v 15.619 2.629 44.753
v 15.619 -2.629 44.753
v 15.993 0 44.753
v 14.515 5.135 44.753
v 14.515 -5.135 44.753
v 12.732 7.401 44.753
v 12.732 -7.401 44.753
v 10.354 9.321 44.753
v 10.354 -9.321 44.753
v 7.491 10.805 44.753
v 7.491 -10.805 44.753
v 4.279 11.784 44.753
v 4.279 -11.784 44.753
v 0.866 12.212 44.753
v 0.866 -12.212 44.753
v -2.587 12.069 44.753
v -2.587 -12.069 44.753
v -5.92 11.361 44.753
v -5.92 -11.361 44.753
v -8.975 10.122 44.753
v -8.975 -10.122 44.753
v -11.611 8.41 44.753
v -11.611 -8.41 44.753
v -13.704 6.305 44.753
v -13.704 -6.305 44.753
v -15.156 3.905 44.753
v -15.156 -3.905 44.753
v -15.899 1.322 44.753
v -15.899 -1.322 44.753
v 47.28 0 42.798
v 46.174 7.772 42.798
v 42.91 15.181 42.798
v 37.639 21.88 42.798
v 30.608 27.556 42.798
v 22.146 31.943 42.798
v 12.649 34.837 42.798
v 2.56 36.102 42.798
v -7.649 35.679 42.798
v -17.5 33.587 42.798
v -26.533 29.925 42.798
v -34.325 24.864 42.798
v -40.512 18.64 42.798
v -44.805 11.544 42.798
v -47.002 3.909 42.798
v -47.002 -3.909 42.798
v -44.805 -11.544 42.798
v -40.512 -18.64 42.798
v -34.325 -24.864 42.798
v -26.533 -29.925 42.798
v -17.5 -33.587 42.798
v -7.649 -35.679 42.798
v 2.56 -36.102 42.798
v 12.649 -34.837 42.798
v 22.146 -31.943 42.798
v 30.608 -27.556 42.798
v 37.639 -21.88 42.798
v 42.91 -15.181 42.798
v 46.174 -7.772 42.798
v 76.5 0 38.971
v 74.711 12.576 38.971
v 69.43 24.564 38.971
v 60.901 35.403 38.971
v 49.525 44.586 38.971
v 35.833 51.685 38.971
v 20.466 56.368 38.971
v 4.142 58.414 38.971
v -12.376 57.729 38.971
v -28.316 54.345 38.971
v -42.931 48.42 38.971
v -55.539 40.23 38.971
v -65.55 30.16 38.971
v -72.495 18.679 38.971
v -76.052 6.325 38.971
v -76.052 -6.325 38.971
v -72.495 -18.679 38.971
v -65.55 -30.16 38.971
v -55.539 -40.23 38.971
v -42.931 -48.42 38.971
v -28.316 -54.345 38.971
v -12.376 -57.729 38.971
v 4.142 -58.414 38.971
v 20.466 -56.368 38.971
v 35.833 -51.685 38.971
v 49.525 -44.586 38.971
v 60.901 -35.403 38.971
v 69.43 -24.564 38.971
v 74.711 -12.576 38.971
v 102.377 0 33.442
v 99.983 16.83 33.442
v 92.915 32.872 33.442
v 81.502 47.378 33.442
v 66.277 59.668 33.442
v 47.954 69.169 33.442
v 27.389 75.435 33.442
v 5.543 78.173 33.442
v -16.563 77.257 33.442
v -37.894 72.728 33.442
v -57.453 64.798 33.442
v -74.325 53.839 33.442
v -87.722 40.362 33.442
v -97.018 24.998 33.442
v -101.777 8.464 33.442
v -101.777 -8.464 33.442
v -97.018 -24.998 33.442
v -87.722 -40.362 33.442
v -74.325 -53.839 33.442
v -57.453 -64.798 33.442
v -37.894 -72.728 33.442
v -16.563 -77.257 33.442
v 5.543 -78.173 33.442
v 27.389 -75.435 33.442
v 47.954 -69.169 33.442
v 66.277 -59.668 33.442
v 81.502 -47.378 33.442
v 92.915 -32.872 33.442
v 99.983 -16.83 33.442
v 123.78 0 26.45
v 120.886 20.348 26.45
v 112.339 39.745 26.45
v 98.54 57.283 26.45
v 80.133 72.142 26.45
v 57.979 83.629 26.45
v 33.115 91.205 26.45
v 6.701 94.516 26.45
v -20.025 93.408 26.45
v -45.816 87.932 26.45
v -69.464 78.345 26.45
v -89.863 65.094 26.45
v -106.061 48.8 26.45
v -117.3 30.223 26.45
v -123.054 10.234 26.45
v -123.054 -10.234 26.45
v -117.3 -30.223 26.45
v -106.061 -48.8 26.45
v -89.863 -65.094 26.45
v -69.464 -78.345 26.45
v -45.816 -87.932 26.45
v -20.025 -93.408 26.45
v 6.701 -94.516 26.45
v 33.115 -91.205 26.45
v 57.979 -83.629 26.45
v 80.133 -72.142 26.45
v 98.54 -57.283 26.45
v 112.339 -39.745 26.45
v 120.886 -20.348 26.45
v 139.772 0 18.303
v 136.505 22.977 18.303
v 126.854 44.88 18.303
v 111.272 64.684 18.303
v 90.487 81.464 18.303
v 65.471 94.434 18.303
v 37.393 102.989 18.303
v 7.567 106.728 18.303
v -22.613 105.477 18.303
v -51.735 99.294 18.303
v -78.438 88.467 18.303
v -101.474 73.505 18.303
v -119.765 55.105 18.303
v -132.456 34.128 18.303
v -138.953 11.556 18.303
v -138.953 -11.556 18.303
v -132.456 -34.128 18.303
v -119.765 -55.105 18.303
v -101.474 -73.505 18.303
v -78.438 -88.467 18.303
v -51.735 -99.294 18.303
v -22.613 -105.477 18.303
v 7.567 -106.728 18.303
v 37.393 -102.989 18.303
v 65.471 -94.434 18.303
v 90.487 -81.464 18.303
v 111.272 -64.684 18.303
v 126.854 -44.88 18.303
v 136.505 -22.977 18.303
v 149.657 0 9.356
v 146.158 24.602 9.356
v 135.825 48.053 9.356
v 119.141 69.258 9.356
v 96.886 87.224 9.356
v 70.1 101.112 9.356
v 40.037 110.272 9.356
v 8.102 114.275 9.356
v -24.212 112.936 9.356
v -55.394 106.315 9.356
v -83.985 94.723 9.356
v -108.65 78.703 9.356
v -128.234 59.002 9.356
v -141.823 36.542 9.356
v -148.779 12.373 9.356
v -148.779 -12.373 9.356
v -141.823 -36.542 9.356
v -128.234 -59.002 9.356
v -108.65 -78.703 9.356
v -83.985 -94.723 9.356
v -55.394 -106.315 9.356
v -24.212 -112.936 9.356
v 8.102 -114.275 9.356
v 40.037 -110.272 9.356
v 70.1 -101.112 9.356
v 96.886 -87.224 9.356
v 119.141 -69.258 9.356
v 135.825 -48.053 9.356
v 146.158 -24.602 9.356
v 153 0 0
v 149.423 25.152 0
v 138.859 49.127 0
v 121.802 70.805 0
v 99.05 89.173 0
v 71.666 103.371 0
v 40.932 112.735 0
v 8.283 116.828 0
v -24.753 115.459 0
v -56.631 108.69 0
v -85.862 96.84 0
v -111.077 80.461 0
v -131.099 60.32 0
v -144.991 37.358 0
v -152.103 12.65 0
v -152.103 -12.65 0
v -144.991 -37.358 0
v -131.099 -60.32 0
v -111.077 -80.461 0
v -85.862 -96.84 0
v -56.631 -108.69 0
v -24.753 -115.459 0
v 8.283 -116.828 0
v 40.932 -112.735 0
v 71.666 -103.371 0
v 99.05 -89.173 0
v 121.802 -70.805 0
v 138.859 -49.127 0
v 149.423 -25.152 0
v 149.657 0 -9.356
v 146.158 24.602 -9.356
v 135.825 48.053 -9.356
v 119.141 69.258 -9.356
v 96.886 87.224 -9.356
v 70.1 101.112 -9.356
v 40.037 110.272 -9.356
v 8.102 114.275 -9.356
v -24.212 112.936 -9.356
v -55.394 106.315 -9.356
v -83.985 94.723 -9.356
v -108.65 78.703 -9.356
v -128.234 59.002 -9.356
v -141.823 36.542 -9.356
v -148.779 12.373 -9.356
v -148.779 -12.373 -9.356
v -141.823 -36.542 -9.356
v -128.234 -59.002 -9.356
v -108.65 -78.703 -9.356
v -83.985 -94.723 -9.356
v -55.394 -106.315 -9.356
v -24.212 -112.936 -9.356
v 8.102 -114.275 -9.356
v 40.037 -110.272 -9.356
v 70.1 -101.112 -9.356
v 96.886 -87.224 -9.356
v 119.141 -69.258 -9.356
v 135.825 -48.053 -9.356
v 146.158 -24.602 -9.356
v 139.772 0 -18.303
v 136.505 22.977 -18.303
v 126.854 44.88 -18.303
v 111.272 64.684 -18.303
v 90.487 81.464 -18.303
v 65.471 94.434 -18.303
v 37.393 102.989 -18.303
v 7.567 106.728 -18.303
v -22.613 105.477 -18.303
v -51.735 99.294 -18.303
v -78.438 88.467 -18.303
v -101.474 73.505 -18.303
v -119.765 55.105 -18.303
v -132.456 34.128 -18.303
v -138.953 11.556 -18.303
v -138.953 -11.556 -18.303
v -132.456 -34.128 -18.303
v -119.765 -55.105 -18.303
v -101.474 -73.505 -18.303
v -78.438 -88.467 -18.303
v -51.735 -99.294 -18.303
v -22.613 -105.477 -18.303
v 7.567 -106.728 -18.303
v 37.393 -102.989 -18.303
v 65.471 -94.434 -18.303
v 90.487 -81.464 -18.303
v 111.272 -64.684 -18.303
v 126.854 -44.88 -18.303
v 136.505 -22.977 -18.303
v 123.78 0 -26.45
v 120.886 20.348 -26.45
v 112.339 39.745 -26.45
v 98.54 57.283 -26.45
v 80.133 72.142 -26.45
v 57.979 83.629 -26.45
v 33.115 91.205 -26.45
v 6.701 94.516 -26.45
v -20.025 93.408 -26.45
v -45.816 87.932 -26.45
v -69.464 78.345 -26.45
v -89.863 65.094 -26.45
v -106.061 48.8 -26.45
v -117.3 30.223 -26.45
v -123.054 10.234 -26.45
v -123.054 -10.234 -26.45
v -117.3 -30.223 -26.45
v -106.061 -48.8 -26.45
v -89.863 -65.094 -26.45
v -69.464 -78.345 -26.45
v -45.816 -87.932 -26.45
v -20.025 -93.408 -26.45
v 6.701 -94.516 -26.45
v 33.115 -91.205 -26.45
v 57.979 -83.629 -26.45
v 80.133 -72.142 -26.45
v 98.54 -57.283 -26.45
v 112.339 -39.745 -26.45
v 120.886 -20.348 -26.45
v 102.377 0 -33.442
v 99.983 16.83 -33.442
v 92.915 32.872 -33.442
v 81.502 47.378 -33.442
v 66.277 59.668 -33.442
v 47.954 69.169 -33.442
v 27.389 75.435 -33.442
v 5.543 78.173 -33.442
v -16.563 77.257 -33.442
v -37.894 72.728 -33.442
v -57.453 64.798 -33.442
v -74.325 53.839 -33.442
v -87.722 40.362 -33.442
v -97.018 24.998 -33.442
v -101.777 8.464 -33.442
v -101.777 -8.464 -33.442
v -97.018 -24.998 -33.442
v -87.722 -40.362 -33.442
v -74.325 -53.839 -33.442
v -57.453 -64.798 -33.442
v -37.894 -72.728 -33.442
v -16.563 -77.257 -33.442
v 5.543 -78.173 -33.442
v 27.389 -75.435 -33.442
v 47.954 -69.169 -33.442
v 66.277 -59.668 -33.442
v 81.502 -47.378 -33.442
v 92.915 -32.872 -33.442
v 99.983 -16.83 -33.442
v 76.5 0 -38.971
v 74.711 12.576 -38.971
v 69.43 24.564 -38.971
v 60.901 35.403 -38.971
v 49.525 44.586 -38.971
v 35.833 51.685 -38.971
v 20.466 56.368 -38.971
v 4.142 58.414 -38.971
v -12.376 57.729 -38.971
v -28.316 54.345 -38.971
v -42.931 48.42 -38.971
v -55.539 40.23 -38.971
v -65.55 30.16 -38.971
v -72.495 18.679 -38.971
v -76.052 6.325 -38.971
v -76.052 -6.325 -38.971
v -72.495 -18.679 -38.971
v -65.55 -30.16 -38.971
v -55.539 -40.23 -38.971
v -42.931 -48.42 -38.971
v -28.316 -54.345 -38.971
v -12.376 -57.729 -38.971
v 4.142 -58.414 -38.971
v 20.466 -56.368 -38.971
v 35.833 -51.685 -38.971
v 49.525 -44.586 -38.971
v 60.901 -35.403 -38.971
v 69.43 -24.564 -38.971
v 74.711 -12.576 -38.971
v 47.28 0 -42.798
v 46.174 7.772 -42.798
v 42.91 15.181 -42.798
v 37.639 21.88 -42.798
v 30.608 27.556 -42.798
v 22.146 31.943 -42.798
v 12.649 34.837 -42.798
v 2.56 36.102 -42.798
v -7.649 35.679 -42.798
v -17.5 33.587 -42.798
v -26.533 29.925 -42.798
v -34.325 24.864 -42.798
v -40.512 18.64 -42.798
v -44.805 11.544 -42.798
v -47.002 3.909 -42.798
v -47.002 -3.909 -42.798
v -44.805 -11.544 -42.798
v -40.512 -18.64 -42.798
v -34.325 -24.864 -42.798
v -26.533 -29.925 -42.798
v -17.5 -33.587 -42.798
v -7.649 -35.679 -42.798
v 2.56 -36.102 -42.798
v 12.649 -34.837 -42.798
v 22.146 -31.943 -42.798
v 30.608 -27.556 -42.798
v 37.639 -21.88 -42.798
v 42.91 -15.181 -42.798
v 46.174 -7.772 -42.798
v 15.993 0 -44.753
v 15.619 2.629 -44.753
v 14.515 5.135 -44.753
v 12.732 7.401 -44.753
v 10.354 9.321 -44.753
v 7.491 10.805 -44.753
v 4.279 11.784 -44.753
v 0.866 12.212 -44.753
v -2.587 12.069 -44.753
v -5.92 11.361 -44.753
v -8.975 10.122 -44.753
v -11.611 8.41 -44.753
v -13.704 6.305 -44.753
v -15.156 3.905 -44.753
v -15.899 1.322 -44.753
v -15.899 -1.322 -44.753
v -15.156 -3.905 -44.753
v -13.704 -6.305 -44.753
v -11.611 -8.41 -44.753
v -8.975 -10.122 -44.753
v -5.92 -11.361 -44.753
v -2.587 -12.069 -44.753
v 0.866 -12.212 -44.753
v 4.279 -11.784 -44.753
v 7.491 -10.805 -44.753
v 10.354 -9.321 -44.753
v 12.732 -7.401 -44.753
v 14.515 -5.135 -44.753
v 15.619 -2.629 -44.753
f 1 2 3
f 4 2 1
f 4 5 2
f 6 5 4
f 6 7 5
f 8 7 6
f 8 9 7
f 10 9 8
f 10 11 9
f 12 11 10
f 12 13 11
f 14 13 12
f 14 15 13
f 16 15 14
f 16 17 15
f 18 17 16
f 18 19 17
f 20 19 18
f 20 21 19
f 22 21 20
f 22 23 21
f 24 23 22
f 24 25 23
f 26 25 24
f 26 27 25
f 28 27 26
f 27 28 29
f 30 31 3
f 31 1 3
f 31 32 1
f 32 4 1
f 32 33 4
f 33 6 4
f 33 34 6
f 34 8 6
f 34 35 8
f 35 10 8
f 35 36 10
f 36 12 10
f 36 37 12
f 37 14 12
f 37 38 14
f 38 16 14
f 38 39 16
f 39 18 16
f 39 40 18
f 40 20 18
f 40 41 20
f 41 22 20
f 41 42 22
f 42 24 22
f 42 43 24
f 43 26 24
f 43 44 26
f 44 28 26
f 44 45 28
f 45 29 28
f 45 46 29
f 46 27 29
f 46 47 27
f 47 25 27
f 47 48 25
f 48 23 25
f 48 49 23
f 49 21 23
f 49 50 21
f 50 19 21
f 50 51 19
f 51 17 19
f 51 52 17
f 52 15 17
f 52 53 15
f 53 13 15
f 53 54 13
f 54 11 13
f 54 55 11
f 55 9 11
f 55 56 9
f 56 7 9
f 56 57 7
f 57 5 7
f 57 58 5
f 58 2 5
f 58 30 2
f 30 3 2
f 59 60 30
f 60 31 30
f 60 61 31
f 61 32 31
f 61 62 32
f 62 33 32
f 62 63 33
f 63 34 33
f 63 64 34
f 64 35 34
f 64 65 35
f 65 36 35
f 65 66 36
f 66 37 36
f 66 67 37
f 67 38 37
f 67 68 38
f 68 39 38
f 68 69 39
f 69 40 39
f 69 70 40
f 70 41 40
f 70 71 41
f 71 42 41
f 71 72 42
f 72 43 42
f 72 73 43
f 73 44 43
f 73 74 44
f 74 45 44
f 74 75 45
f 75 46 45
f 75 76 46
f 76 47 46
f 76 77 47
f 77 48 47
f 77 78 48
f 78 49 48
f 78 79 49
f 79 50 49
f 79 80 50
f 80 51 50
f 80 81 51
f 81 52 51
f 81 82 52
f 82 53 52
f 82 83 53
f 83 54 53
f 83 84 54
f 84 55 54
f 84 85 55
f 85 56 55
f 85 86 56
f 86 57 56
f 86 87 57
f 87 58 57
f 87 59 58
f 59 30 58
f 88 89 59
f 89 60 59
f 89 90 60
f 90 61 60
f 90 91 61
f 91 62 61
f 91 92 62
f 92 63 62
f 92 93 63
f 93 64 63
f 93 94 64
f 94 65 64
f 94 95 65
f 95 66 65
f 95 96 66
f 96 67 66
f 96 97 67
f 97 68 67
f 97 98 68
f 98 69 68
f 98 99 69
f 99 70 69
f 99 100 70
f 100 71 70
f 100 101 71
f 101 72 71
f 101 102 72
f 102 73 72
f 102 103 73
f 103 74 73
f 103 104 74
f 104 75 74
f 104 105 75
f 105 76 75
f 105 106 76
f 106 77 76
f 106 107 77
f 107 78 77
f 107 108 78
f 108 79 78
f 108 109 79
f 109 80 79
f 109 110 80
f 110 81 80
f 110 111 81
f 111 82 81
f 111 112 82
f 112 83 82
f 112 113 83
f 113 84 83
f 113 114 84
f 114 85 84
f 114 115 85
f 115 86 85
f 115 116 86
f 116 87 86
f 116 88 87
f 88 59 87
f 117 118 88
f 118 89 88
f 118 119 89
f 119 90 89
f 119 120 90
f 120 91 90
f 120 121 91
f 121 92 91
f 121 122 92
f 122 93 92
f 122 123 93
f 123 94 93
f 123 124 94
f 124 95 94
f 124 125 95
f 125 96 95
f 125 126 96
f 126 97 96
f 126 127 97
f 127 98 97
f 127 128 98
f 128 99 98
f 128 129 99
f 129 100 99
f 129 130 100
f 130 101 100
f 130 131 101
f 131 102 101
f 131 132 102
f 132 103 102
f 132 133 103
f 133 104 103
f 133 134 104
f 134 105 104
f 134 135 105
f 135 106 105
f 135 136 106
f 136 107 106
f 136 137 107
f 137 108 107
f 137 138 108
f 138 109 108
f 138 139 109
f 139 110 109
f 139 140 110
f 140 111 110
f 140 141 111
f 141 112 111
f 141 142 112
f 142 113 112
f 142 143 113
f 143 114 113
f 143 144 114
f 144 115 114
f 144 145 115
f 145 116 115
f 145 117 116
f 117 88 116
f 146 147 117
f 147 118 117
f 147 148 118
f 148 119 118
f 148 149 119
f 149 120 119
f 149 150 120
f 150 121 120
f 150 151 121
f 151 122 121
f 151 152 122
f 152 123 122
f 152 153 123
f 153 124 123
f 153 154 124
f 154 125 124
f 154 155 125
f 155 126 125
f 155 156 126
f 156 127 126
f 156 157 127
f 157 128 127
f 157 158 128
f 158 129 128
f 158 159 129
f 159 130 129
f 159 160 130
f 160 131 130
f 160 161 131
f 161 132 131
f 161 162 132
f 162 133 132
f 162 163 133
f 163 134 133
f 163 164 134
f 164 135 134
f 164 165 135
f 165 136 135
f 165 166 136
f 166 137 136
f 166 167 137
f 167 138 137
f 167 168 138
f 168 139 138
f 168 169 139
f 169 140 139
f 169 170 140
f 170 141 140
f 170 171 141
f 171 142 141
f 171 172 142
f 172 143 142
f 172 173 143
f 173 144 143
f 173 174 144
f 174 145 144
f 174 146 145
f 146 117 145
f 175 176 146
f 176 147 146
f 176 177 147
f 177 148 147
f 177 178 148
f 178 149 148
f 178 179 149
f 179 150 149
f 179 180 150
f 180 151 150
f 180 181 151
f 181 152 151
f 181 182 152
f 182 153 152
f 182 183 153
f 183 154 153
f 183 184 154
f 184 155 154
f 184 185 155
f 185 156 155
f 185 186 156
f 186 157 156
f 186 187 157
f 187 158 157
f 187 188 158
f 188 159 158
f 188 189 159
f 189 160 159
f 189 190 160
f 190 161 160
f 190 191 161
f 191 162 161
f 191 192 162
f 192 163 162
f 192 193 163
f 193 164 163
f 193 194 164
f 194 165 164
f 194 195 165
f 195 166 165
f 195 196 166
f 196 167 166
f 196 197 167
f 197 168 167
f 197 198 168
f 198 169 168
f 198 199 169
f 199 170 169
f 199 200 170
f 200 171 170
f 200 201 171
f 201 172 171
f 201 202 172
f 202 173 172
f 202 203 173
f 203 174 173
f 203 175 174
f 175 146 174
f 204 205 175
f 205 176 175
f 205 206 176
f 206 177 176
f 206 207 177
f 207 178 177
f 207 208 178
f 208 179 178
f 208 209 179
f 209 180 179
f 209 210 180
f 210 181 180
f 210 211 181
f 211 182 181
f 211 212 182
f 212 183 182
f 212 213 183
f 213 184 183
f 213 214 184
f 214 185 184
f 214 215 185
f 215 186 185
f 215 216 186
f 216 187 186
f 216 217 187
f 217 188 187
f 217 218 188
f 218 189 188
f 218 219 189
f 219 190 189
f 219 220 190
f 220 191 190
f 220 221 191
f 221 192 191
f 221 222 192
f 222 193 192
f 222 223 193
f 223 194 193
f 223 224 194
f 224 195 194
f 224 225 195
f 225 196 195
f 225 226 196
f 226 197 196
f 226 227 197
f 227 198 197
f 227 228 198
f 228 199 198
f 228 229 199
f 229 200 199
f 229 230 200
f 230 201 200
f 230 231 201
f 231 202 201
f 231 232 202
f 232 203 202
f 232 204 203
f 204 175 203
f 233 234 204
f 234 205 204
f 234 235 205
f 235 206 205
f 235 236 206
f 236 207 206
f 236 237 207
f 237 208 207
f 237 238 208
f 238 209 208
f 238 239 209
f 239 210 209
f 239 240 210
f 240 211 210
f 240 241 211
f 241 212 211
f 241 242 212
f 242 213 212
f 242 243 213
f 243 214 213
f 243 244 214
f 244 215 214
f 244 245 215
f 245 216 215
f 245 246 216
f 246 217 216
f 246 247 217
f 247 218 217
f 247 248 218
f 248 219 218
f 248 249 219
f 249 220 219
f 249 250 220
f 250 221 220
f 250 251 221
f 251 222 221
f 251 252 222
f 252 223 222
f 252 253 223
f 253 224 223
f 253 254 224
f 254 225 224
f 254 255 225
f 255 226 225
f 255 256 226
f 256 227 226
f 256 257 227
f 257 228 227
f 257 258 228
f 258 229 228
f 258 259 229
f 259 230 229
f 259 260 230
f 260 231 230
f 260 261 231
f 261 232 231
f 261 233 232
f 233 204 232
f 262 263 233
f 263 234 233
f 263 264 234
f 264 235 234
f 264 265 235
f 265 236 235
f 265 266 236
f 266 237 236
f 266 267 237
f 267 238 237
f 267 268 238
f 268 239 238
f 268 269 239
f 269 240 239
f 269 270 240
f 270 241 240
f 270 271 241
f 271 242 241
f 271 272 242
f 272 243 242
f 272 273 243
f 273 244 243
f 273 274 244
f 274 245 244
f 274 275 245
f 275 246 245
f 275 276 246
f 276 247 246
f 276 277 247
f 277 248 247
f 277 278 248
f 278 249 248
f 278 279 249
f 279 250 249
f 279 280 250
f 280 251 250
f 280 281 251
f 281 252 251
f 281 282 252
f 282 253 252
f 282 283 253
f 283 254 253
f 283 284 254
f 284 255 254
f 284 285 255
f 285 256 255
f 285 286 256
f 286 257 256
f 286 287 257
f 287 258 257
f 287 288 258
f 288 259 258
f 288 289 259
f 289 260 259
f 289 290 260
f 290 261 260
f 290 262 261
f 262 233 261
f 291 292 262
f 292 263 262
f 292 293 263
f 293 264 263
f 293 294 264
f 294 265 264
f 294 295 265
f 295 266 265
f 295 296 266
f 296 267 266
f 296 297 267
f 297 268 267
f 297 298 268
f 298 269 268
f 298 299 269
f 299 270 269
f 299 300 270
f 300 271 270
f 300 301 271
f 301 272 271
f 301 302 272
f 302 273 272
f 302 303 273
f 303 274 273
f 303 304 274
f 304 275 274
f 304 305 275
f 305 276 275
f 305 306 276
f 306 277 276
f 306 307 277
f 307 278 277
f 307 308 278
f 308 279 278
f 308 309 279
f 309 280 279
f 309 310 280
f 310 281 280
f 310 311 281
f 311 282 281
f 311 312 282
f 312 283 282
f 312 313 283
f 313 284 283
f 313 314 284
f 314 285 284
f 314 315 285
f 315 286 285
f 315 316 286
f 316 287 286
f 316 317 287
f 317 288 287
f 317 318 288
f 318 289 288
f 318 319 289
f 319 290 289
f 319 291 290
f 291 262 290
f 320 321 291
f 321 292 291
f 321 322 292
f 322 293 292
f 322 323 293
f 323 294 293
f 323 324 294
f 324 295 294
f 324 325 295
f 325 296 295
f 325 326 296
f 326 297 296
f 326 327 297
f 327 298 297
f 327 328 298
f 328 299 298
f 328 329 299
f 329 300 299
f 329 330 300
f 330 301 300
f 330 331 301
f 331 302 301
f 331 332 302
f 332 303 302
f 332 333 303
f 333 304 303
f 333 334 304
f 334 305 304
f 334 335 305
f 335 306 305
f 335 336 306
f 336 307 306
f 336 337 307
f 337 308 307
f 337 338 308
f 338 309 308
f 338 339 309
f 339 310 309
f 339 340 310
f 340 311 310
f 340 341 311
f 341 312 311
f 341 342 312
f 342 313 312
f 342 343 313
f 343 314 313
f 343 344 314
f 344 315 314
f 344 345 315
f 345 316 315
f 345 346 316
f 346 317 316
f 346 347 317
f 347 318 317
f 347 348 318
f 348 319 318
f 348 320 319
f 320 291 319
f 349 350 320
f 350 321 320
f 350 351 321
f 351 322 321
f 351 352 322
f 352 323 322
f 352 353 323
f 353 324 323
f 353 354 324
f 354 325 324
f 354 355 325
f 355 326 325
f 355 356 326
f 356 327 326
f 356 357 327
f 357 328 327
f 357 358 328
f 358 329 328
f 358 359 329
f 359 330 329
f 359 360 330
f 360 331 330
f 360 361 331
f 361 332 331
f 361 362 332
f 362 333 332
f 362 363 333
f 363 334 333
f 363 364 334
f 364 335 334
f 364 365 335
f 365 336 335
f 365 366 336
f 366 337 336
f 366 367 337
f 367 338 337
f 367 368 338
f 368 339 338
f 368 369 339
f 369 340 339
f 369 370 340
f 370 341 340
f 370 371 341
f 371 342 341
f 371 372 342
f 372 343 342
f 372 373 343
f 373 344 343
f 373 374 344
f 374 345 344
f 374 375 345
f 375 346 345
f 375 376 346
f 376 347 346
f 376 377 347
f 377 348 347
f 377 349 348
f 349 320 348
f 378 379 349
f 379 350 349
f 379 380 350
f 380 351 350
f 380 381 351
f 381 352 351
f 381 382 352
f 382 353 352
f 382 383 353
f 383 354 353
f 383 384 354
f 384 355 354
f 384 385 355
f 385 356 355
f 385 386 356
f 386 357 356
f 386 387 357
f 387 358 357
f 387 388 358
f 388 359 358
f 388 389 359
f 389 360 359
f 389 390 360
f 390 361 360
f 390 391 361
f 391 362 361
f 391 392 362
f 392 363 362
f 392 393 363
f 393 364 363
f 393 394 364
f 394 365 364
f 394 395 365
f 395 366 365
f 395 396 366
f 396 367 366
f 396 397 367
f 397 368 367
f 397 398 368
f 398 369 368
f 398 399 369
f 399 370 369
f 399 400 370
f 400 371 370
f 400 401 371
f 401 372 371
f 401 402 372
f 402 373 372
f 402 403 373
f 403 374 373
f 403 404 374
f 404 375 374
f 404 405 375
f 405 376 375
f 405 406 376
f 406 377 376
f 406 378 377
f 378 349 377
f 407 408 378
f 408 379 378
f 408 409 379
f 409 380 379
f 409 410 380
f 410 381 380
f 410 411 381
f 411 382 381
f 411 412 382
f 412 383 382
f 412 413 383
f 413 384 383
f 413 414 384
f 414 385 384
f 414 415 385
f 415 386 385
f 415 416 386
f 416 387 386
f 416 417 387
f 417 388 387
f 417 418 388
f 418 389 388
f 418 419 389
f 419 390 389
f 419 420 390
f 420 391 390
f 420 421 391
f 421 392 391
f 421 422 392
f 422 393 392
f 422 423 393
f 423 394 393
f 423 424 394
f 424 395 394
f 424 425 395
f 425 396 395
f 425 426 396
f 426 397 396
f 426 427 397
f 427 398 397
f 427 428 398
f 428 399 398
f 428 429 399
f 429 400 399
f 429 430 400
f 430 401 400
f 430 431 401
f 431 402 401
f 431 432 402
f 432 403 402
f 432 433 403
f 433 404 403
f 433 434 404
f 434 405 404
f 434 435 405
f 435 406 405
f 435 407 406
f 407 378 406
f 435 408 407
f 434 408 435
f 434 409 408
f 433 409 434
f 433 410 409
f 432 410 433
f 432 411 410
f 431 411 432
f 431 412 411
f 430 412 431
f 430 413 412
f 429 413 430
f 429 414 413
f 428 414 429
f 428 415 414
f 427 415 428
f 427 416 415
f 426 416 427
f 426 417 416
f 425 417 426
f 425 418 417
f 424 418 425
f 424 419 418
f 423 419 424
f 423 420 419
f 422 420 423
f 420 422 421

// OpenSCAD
// Generated by SolidPython 1.0.1 on 2020-07-29 00:46:53


scale(v = [17, 13, 5]) {
	sphere(r = 9);
}
/***********************************************
*********      SolidPython code:      **********
************************************************
 
# import packages: SolidPython
from solid import *
from solid.utils import *
from itertools import chain, combinations, permutations


class Resize:

    def __init__(self, scad_file):
        self.scad_file = scad_file
        #self.scad_file = import_scad(scad_file)
        # cone/cylinder param:
        self.r1 = 0
        self.r2 = 0
        self.h = 0
        # rectangular prism param:
        self.w = 0
        self.l = 0
        # ellipse param:
        self.r = 0

    # import OpenScad code (file name corresponds to shape)


    # classify shape + parameters
    def assign(self, param1, param2, param3):
        if self.scad_file == 'cone.scad':
            self.r1 = param1
            self.r2 = param2
            self.h = param3
        elif self.scad_file == 'cylinder.scad':
            self.r1 = param1
            self.r2 = param2
            self.h = param3
        elif self.scad_file == 'rectangularPrism.scad':
            self.h = param1
            self.l = param2
            self.w = param3
        else:
            self.r = param1
            self.h = param2

    # resize parameters
    def iterate(self):
        x = range(3, 20, 2)
        i = 1
        if self.scad_file == 'cone.scad':
            tempList = list(permutations(x, 2))
            for temp in tempList:
                param1 = temp[0]
                param2 = temp[1]
                filepath = 'produced_scad_files/' + 'cone' + str(param1) + '_' + str(param2) + '_' + '.scad'
                scad_render_to_file(cylinder(h=param1, r1=param2, r2=0), filepath)

        elif self.scad_file == 'cylinder.scad':
            tempList = list(permutations(x, 3))
            for temp in tempList:
                param1 = temp[0]
                param2 = temp[1]
                filepath = 'produced_scad_files/' + 'cylinder' + str(param1) + '_' + str(param2) + '_' + '.scad'
                scad_render_to_file(cylinder(h=param1, r1=param2, r2=param2), filepath)

        elif self.scad_file == 'rectangularPrism.scad':
            tempList = list(permutations(x, 3))
            for temp in tempList:
                param1 = temp[0]
                param2 = temp[1]
                param3 = temp[2]
                filepath = 'produced_scad_files/' + 'rectangularPrism' + str(param1) + '_' + str(param2) + '_' + str(
                    param3) + '.scad'
                scad_render_to_file(cube(size=(param1, param2, param3)), filepath)

        elif self.scad_file == 'ellipse.scad':
            tempList = list(permutations(x, 4))
            for temp in tempList:
                param1 = temp[0]
                param2 = temp[1]
                param3 = temp[2]
                param4 = temp[3]
                filepath = 'produced_scad_files/' + 'ellipse' + str(param1) + '_' + str(param2) + '_' + str(param3) + '_' + str(param4) + '.scad'
                scad_render_to_file(scale([param1, param2, param3])(sphere(r=param4)), filepath)

    def render_to_scadfile(self):
        scad_render_to_file(scad, 'example.scad') 
 
************************************************/
